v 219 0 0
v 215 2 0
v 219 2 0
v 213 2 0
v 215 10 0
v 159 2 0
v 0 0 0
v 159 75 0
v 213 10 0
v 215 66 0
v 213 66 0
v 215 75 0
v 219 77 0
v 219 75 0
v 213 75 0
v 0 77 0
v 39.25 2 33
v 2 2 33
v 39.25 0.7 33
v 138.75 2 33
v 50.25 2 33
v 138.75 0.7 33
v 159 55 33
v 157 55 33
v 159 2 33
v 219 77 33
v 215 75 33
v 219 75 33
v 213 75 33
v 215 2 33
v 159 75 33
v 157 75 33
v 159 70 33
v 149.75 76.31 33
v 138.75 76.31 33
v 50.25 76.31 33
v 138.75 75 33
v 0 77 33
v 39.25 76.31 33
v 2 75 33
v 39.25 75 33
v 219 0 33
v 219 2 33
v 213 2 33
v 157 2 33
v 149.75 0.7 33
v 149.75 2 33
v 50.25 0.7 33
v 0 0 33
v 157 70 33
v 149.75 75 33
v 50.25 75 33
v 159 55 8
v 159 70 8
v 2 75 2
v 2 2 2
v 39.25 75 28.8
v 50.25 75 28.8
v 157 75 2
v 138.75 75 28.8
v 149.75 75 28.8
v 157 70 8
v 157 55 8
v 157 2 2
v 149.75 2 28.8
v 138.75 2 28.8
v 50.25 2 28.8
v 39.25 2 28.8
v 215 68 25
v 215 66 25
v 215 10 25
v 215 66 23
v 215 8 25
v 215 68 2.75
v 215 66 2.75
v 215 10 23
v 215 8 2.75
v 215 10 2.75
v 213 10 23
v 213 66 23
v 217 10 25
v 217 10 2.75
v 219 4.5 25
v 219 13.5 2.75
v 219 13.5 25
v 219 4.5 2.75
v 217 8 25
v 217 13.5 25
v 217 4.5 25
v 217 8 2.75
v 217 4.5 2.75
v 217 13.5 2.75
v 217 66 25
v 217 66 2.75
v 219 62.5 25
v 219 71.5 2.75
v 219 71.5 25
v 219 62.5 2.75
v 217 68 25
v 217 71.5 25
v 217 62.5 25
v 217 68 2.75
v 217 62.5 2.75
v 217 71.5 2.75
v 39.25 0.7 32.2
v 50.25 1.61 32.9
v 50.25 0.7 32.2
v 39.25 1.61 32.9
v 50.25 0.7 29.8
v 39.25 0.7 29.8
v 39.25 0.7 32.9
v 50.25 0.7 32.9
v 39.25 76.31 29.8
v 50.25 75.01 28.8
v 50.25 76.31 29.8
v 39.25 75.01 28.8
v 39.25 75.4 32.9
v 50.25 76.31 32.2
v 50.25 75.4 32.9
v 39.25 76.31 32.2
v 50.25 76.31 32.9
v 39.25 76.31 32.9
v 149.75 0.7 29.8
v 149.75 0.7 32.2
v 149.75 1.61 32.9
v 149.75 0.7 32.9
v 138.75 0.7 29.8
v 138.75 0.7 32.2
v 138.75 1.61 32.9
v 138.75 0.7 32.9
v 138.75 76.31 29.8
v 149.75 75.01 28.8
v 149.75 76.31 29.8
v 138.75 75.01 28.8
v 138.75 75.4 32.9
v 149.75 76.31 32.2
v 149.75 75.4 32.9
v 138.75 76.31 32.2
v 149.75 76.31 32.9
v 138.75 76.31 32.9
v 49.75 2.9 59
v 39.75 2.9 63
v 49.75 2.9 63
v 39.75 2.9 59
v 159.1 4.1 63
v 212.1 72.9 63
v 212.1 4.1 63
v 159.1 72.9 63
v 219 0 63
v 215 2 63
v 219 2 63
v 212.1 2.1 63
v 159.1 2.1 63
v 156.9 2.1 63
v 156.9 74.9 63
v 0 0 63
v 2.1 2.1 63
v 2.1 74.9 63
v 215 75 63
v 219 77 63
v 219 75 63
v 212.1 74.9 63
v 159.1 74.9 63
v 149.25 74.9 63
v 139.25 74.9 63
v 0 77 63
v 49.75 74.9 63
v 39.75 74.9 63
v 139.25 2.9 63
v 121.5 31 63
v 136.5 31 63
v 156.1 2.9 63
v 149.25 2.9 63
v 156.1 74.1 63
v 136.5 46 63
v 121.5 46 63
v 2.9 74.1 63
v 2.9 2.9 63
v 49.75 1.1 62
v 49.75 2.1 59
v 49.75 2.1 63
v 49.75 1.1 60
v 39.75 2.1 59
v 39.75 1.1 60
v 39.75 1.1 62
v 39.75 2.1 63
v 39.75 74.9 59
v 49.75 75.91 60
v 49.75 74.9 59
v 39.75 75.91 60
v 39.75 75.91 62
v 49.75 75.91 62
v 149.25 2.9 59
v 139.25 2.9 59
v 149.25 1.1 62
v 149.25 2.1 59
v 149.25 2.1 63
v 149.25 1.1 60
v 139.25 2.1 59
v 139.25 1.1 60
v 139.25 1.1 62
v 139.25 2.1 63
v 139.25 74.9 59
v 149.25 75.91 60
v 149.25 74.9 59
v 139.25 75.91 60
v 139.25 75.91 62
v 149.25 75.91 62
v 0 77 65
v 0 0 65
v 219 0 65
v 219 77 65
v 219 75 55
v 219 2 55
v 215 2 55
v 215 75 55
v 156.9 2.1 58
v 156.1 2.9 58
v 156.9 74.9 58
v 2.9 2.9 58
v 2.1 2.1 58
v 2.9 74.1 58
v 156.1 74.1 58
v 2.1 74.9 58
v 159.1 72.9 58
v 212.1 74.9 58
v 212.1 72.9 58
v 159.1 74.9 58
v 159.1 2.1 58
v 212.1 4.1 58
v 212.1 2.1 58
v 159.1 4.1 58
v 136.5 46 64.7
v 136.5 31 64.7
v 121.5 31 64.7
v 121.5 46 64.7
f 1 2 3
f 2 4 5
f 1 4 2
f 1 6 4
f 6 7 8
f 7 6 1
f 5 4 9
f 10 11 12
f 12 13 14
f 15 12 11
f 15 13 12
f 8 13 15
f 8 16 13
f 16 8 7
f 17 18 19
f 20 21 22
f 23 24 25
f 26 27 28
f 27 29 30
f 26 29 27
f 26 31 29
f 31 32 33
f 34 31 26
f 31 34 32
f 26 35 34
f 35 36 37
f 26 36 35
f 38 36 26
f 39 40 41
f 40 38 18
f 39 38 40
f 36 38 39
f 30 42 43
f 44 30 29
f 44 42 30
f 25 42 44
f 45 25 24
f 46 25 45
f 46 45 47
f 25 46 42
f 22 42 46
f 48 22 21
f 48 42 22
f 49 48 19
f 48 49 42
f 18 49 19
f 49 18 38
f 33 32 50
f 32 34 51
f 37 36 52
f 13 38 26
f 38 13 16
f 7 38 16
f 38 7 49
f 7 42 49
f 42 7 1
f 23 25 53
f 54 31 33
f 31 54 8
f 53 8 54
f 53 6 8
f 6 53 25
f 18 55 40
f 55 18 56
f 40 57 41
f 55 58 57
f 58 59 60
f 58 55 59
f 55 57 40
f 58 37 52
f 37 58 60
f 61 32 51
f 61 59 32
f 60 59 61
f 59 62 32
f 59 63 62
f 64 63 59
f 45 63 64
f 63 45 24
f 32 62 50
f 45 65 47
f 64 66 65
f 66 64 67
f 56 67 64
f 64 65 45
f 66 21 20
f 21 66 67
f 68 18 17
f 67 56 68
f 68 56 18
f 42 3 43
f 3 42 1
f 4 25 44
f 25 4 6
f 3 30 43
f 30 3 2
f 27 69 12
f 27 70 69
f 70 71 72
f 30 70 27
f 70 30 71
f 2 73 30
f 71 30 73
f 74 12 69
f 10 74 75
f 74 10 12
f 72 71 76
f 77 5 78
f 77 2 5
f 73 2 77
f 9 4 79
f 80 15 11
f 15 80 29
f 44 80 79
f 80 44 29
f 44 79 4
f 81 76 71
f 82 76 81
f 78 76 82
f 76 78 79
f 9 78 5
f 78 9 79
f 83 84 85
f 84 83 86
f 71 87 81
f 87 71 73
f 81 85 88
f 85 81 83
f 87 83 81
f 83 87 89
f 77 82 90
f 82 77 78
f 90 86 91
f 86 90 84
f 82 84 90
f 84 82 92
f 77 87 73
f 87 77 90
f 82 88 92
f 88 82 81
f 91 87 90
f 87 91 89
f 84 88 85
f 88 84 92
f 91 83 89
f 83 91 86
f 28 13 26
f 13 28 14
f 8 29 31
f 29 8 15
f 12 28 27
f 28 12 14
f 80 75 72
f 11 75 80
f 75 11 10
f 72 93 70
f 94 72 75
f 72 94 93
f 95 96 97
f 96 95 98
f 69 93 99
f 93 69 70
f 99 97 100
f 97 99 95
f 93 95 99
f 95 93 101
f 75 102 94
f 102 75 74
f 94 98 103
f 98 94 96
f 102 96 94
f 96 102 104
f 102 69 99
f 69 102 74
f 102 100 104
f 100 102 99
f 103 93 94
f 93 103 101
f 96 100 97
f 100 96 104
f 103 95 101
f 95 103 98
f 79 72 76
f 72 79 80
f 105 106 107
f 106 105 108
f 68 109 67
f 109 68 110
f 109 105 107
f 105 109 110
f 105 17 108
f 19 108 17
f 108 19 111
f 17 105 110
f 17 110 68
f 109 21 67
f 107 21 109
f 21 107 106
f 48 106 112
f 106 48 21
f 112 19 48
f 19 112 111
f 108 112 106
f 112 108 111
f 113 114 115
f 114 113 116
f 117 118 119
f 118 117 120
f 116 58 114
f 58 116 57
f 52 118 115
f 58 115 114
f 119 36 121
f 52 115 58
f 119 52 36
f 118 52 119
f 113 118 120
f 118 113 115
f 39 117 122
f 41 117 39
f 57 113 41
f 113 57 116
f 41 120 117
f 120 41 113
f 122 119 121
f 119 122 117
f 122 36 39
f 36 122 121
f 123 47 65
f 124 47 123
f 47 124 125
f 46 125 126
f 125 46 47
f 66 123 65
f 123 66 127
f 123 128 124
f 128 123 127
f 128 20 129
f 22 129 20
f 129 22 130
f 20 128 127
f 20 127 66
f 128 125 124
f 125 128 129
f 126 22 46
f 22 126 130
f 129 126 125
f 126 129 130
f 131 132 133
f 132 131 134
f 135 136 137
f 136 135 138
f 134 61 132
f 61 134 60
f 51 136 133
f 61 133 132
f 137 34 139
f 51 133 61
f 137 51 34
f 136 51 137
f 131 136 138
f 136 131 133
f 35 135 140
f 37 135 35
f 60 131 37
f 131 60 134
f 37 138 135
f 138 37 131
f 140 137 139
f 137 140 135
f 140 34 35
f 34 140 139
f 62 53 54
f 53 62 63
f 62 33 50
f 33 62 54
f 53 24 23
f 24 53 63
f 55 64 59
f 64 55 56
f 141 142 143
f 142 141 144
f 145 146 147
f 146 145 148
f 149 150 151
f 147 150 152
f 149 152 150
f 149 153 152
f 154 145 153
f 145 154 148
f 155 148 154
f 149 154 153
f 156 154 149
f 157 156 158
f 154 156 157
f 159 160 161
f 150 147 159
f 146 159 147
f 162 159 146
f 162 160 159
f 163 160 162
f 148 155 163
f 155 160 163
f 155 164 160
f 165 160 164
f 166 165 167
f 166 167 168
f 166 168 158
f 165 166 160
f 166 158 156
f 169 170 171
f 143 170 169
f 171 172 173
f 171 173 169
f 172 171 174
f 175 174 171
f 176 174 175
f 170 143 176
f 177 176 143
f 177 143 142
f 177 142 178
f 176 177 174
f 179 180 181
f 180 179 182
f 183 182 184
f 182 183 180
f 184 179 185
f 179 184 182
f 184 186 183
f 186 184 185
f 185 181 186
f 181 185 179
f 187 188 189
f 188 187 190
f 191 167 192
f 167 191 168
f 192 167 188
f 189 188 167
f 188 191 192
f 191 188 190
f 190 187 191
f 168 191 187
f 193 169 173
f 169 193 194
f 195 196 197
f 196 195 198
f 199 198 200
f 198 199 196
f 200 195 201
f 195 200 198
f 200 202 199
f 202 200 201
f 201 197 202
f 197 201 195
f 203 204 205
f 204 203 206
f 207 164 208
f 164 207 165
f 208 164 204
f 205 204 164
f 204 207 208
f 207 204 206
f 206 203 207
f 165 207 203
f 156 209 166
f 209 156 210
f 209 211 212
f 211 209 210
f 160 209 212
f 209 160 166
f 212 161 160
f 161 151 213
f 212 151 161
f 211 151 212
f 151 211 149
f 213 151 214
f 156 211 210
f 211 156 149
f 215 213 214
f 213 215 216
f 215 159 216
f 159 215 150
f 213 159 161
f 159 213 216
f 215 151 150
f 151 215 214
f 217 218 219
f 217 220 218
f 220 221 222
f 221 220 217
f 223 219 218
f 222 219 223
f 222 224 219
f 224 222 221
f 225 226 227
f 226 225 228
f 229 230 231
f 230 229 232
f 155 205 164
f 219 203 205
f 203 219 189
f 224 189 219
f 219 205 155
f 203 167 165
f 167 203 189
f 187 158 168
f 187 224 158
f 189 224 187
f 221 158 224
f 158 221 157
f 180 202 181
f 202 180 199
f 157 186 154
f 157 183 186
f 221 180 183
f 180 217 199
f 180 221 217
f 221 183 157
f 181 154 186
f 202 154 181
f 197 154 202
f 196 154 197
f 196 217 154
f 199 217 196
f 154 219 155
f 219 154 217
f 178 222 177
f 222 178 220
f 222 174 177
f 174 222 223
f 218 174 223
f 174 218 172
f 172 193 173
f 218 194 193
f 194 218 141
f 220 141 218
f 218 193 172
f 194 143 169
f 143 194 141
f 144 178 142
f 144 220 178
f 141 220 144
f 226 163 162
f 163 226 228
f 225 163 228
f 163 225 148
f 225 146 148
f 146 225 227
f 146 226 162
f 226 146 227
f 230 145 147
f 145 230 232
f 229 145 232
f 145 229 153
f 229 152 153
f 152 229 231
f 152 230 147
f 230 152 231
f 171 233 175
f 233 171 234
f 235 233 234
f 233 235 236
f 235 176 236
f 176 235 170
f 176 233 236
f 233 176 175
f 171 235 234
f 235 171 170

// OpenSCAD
$fn = 60;

// --- Customization ---
render_mode = 2; // [0:Base Tray, 1:Snap Lid, 2:Both (Exploded)]

// --- Dimensions ---
pb_w = 155.0; // Powerbank Width (X)
pb_d = 73.0;  // Powerbank Depth (Y)
pb_h = 31.0;  // Powerbank Height (Z)

gap_w = 60.0; // Empty space for cable on the right side
wt = 2.0;     // Wall thickness
base_thickness = 2.0;
explode_dist = (render_mode == 2) ? 30 : 0;
fit_tolerance = 0.1;

// Hook variables
hook_w = 10.0;
hook_h = 4.0;
hook_protrusion = 1.0;
tab_x1 = (pb_w + 2*wt + gap_w) * 0.25 - 10; 
tab_x2 = (pb_w + 2*wt + gap_w) * 0.75 - 20; 

// =================== T‑PRONG PARAMETERS ===================
// General
prong_wall_extension_len = gap_w - 6.0;  
prong_jog_x_offset = 6.0;               
prong_neck_x_length = 4.0;              
prong_head_x_length = wt;               


// Front prong 
front_jog_height = 10.0;                
front_neck_y_start = 8.0;               
front_head_y_start = 4.5;               
front_neck_width = wt;                  
front_head_width = 9.0;                 

// Back prong 
back_jog_height = 10.0;                 
back_neck_y_start = 66.0;               
back_head_y_start = 62.5;               
back_neck_width = wt;
back_head_width = 9.0;
// ============================================================================

module base_tray() {
    end_x = pb_w + 2*wt + gap_w;
    
    prong_z_start = 2.75;
    prong_z_height = (pb_h + base_thickness) - prong_z_start - 8.0;
    
    union() {
        difference() {
            union() {
                // Main outer walls
                linear_extrude(pb_h + base_thickness) 
                difference() {
                    square([pb_w + 2*wt, pb_d + 2*wt]);
                    translate([wt, wt]) square([pb_w, pb_d]);
                }
                
                // Separating wall at the end of the powerbank
                translate([pb_w + wt, wt, base_thickness])
                cube([wt, pb_d, pb_h]);

                // --- FRONT WALL EXTENSION & T-PRONG ---
                translate([pb_w + 2*wt, 0, 0]) 
                    cube([prong_wall_extension_len + 3*wt, wt, pb_h + base_thickness]);
                translate([end_x - prong_jog_x_offset, 0, 0]) 
                    cube([wt, front_jog_height, pb_h + base_thickness]);
                translate([end_x - prong_neck_x_length, front_neck_y_start, prong_z_start]) 
                    cube([prong_neck_x_length, front_neck_width, prong_z_height]);
                translate([end_x - prong_head_x_length, front_head_y_start, prong_z_start]) 
                    cube([prong_head_x_length, front_head_width, prong_z_height]);

                // --- BACK WALL EXTENSION & T-PRONG ---
                translate([pb_w + 2*wt, pb_d + wt, 0]) 
                    cube([prong_wall_extension_len + 3*wt, wt, pb_h + base_thickness]);
                translate([end_x - prong_jog_x_offset, back_neck_y_start, 0]) 
                    cube([wt, back_jog_height, pb_h + base_thickness]);
                translate([end_x - prong_neck_x_length, back_neck_y_start, prong_z_start]) 
                    cube([prong_neck_x_length, back_neck_width, prong_z_height]);
                translate([end_x - prong_head_x_length, back_head_y_start, prong_z_start]) 
                    cube([prong_head_x_length, back_head_width, prong_z_height]);
                    
                // --- TOP CONTINUOUS WALL ---
                translate([end_x - 3*wt, 0, pb_h + base_thickness - 10.0])
                    cube([wt, pb_d + 2*wt, 10.0]);
            }
            
            // Wire slot pushed 5mm further into the middle of the wall
            translate([pb_w + wt - 1.0, pb_d + 2*wt - 22.0, base_thickness + pb_h - 25])
            cube([wt + 2.0, 15.0, 25.0]);

            // Snap fit pockets
            pocket_z = base_thickness + pb_h - 4;
            for(tx = [tab_x1, tab_x2]) {
                // Front wall inner pocket
                translate([tx, wt, pocket_z])
                hull() {
                    translate([-(hook_w+1)/2, 0, -0.2]) cube([hook_w+1, 0.01, hook_h + 0.4]);
                    translate([-(hook_w+1)/2, -hook_protrusion - 0.3, 0.8]) cube([hook_w+1, 0.01, hook_h - 1.6]);
                }
                translate([tx, wt, base_thickness + pb_h])
                hull() {
                    translate([-(hook_w+1)/2, 0, -0.1]) cube([hook_w+1, 0.01, 0.1]);
                    translate([-(hook_w+1)/2, -hook_protrusion - 0.3, -0.1]) cube([hook_w+1, 0.01, 0.1]);
                    translate([-(hook_w+1)/2, 0, hook_protrusion + 0.2]) cube([hook_w+1, 0.01, 0.1]);
                }
                
                // Back wall inner pocket
                translate([tx, pb_d + wt, pocket_z])
                hull() {
                    translate([-(hook_w+1)/2, 0, -0.2]) cube([hook_w+1, 0.01, hook_h + 0.4]);
                    translate([-(hook_w+1)/2, hook_protrusion + 0.3, 0.8]) cube([hook_w+1, 0.01, hook_h - 1.6]);
                }
                translate([tx, pb_d + wt, base_thickness + pb_h])
                hull() {
                    translate([-(hook_w+1)/2, 0, -0.1]) cube([hook_w+1, 0.01, 0.1]);
                    translate([-(hook_w+1)/2, hook_protrusion + 0.3, -0.1]) cube([hook_w+1, 0.01, 0.1]);
                    translate([-(hook_w+1)/2, 0, hook_protrusion + 0.2]) cube([hook_w+1, 0.01, 0.1]);
                }
            }
        }
        
        // Floor generation
        linear_extrude(base_thickness)
        square([pb_w + 2*wt, pb_d + 2*wt]);
    }
}

module snap_lid() {
    total_len = pb_w + 2*wt + gap_w;
    lid_len = total_len; 
    
    translate([0, 0, base_thickness + pb_h + explode_dist])
    difference() {
        union() {
            linear_extrude(wt) 
            square([lid_len, pb_d + 2*wt]);

            // Downward lip adjusted to fit between the outer side walls
            translate([total_len - 4.0, wt, -8.0])
            cube([4.0, pb_d, 8.0]);

            translate([0, 0, -5])
            linear_extrude(5)
            union() {
                difference() {
                    // Outer perimeter of the lip
                    translate([wt + fit_tolerance, wt + fit_tolerance])
                    square([pb_w - 2*fit_tolerance, pb_d - 2*fit_tolerance]);
                    
                    // Inner perimeter (cutout) using a custom lip thickness
                    lip_t = 0.8; 
                    translate([wt + fit_tolerance + lip_t, wt + fit_tolerance + lip_t])
                    square([pb_w - 2*fit_tolerance - 2*lip_t, pb_d - 2*fit_tolerance - 2*lip_t]);
                }
                
                translate([pb_w + 2*wt + fit_tolerance, wt + fit_tolerance])
                square([gap_w - 7.0, wt]);
                
                translate([pb_w + 2*wt + fit_tolerance, pb_d - fit_tolerance])
                square([gap_w - 7.0, wt]);
            }
            
            lip_t = 0.8; // Match the thickness of your thinned inner lip

            for(tx = [tab_x1, tab_x2]) {
                // Front hooks
                translate([tx, wt + fit_tolerance, -4])
                hull() {
                    // Changed 'wt' to 'lip_t' so the stem doesn't stick out
                    translate([-hook_w/2, 0, 0]) cube([hook_w, lip_t, hook_h]);
                    translate([-hook_w/2, -hook_protrusion, 1]) cube([hook_w, 0.01, hook_h-2]);
                }
                
                // Back hooks
                translate([tx, pb_d + wt - fit_tolerance, -4])
                hull() {
                    // Changed '-wt' to '-lip_t' and 'wt' to 'lip_t'
                    translate([-hook_w/2, -lip_t, 0]) cube([hook_w, lip_t, hook_h]);
                    translate([-hook_w/2, hook_protrusion, 1]) cube([hook_w, 0.01, hook_h-2]);
                }
            }
        }
        
        translate([(pb_w + wt) - 23.0 - 12.5, (pb_d + 2*wt)/2 - 7.5, -1])
        cube([15.0, 15.0, wt + 0.7]);
    }
}

if (render_mode == 0 || render_mode == 2) {
    color("DarkSlateGray") base_tray();
}
if (render_mode == 1 || render_mode == 2) {
    color("LightGray") snap_lid();
}
